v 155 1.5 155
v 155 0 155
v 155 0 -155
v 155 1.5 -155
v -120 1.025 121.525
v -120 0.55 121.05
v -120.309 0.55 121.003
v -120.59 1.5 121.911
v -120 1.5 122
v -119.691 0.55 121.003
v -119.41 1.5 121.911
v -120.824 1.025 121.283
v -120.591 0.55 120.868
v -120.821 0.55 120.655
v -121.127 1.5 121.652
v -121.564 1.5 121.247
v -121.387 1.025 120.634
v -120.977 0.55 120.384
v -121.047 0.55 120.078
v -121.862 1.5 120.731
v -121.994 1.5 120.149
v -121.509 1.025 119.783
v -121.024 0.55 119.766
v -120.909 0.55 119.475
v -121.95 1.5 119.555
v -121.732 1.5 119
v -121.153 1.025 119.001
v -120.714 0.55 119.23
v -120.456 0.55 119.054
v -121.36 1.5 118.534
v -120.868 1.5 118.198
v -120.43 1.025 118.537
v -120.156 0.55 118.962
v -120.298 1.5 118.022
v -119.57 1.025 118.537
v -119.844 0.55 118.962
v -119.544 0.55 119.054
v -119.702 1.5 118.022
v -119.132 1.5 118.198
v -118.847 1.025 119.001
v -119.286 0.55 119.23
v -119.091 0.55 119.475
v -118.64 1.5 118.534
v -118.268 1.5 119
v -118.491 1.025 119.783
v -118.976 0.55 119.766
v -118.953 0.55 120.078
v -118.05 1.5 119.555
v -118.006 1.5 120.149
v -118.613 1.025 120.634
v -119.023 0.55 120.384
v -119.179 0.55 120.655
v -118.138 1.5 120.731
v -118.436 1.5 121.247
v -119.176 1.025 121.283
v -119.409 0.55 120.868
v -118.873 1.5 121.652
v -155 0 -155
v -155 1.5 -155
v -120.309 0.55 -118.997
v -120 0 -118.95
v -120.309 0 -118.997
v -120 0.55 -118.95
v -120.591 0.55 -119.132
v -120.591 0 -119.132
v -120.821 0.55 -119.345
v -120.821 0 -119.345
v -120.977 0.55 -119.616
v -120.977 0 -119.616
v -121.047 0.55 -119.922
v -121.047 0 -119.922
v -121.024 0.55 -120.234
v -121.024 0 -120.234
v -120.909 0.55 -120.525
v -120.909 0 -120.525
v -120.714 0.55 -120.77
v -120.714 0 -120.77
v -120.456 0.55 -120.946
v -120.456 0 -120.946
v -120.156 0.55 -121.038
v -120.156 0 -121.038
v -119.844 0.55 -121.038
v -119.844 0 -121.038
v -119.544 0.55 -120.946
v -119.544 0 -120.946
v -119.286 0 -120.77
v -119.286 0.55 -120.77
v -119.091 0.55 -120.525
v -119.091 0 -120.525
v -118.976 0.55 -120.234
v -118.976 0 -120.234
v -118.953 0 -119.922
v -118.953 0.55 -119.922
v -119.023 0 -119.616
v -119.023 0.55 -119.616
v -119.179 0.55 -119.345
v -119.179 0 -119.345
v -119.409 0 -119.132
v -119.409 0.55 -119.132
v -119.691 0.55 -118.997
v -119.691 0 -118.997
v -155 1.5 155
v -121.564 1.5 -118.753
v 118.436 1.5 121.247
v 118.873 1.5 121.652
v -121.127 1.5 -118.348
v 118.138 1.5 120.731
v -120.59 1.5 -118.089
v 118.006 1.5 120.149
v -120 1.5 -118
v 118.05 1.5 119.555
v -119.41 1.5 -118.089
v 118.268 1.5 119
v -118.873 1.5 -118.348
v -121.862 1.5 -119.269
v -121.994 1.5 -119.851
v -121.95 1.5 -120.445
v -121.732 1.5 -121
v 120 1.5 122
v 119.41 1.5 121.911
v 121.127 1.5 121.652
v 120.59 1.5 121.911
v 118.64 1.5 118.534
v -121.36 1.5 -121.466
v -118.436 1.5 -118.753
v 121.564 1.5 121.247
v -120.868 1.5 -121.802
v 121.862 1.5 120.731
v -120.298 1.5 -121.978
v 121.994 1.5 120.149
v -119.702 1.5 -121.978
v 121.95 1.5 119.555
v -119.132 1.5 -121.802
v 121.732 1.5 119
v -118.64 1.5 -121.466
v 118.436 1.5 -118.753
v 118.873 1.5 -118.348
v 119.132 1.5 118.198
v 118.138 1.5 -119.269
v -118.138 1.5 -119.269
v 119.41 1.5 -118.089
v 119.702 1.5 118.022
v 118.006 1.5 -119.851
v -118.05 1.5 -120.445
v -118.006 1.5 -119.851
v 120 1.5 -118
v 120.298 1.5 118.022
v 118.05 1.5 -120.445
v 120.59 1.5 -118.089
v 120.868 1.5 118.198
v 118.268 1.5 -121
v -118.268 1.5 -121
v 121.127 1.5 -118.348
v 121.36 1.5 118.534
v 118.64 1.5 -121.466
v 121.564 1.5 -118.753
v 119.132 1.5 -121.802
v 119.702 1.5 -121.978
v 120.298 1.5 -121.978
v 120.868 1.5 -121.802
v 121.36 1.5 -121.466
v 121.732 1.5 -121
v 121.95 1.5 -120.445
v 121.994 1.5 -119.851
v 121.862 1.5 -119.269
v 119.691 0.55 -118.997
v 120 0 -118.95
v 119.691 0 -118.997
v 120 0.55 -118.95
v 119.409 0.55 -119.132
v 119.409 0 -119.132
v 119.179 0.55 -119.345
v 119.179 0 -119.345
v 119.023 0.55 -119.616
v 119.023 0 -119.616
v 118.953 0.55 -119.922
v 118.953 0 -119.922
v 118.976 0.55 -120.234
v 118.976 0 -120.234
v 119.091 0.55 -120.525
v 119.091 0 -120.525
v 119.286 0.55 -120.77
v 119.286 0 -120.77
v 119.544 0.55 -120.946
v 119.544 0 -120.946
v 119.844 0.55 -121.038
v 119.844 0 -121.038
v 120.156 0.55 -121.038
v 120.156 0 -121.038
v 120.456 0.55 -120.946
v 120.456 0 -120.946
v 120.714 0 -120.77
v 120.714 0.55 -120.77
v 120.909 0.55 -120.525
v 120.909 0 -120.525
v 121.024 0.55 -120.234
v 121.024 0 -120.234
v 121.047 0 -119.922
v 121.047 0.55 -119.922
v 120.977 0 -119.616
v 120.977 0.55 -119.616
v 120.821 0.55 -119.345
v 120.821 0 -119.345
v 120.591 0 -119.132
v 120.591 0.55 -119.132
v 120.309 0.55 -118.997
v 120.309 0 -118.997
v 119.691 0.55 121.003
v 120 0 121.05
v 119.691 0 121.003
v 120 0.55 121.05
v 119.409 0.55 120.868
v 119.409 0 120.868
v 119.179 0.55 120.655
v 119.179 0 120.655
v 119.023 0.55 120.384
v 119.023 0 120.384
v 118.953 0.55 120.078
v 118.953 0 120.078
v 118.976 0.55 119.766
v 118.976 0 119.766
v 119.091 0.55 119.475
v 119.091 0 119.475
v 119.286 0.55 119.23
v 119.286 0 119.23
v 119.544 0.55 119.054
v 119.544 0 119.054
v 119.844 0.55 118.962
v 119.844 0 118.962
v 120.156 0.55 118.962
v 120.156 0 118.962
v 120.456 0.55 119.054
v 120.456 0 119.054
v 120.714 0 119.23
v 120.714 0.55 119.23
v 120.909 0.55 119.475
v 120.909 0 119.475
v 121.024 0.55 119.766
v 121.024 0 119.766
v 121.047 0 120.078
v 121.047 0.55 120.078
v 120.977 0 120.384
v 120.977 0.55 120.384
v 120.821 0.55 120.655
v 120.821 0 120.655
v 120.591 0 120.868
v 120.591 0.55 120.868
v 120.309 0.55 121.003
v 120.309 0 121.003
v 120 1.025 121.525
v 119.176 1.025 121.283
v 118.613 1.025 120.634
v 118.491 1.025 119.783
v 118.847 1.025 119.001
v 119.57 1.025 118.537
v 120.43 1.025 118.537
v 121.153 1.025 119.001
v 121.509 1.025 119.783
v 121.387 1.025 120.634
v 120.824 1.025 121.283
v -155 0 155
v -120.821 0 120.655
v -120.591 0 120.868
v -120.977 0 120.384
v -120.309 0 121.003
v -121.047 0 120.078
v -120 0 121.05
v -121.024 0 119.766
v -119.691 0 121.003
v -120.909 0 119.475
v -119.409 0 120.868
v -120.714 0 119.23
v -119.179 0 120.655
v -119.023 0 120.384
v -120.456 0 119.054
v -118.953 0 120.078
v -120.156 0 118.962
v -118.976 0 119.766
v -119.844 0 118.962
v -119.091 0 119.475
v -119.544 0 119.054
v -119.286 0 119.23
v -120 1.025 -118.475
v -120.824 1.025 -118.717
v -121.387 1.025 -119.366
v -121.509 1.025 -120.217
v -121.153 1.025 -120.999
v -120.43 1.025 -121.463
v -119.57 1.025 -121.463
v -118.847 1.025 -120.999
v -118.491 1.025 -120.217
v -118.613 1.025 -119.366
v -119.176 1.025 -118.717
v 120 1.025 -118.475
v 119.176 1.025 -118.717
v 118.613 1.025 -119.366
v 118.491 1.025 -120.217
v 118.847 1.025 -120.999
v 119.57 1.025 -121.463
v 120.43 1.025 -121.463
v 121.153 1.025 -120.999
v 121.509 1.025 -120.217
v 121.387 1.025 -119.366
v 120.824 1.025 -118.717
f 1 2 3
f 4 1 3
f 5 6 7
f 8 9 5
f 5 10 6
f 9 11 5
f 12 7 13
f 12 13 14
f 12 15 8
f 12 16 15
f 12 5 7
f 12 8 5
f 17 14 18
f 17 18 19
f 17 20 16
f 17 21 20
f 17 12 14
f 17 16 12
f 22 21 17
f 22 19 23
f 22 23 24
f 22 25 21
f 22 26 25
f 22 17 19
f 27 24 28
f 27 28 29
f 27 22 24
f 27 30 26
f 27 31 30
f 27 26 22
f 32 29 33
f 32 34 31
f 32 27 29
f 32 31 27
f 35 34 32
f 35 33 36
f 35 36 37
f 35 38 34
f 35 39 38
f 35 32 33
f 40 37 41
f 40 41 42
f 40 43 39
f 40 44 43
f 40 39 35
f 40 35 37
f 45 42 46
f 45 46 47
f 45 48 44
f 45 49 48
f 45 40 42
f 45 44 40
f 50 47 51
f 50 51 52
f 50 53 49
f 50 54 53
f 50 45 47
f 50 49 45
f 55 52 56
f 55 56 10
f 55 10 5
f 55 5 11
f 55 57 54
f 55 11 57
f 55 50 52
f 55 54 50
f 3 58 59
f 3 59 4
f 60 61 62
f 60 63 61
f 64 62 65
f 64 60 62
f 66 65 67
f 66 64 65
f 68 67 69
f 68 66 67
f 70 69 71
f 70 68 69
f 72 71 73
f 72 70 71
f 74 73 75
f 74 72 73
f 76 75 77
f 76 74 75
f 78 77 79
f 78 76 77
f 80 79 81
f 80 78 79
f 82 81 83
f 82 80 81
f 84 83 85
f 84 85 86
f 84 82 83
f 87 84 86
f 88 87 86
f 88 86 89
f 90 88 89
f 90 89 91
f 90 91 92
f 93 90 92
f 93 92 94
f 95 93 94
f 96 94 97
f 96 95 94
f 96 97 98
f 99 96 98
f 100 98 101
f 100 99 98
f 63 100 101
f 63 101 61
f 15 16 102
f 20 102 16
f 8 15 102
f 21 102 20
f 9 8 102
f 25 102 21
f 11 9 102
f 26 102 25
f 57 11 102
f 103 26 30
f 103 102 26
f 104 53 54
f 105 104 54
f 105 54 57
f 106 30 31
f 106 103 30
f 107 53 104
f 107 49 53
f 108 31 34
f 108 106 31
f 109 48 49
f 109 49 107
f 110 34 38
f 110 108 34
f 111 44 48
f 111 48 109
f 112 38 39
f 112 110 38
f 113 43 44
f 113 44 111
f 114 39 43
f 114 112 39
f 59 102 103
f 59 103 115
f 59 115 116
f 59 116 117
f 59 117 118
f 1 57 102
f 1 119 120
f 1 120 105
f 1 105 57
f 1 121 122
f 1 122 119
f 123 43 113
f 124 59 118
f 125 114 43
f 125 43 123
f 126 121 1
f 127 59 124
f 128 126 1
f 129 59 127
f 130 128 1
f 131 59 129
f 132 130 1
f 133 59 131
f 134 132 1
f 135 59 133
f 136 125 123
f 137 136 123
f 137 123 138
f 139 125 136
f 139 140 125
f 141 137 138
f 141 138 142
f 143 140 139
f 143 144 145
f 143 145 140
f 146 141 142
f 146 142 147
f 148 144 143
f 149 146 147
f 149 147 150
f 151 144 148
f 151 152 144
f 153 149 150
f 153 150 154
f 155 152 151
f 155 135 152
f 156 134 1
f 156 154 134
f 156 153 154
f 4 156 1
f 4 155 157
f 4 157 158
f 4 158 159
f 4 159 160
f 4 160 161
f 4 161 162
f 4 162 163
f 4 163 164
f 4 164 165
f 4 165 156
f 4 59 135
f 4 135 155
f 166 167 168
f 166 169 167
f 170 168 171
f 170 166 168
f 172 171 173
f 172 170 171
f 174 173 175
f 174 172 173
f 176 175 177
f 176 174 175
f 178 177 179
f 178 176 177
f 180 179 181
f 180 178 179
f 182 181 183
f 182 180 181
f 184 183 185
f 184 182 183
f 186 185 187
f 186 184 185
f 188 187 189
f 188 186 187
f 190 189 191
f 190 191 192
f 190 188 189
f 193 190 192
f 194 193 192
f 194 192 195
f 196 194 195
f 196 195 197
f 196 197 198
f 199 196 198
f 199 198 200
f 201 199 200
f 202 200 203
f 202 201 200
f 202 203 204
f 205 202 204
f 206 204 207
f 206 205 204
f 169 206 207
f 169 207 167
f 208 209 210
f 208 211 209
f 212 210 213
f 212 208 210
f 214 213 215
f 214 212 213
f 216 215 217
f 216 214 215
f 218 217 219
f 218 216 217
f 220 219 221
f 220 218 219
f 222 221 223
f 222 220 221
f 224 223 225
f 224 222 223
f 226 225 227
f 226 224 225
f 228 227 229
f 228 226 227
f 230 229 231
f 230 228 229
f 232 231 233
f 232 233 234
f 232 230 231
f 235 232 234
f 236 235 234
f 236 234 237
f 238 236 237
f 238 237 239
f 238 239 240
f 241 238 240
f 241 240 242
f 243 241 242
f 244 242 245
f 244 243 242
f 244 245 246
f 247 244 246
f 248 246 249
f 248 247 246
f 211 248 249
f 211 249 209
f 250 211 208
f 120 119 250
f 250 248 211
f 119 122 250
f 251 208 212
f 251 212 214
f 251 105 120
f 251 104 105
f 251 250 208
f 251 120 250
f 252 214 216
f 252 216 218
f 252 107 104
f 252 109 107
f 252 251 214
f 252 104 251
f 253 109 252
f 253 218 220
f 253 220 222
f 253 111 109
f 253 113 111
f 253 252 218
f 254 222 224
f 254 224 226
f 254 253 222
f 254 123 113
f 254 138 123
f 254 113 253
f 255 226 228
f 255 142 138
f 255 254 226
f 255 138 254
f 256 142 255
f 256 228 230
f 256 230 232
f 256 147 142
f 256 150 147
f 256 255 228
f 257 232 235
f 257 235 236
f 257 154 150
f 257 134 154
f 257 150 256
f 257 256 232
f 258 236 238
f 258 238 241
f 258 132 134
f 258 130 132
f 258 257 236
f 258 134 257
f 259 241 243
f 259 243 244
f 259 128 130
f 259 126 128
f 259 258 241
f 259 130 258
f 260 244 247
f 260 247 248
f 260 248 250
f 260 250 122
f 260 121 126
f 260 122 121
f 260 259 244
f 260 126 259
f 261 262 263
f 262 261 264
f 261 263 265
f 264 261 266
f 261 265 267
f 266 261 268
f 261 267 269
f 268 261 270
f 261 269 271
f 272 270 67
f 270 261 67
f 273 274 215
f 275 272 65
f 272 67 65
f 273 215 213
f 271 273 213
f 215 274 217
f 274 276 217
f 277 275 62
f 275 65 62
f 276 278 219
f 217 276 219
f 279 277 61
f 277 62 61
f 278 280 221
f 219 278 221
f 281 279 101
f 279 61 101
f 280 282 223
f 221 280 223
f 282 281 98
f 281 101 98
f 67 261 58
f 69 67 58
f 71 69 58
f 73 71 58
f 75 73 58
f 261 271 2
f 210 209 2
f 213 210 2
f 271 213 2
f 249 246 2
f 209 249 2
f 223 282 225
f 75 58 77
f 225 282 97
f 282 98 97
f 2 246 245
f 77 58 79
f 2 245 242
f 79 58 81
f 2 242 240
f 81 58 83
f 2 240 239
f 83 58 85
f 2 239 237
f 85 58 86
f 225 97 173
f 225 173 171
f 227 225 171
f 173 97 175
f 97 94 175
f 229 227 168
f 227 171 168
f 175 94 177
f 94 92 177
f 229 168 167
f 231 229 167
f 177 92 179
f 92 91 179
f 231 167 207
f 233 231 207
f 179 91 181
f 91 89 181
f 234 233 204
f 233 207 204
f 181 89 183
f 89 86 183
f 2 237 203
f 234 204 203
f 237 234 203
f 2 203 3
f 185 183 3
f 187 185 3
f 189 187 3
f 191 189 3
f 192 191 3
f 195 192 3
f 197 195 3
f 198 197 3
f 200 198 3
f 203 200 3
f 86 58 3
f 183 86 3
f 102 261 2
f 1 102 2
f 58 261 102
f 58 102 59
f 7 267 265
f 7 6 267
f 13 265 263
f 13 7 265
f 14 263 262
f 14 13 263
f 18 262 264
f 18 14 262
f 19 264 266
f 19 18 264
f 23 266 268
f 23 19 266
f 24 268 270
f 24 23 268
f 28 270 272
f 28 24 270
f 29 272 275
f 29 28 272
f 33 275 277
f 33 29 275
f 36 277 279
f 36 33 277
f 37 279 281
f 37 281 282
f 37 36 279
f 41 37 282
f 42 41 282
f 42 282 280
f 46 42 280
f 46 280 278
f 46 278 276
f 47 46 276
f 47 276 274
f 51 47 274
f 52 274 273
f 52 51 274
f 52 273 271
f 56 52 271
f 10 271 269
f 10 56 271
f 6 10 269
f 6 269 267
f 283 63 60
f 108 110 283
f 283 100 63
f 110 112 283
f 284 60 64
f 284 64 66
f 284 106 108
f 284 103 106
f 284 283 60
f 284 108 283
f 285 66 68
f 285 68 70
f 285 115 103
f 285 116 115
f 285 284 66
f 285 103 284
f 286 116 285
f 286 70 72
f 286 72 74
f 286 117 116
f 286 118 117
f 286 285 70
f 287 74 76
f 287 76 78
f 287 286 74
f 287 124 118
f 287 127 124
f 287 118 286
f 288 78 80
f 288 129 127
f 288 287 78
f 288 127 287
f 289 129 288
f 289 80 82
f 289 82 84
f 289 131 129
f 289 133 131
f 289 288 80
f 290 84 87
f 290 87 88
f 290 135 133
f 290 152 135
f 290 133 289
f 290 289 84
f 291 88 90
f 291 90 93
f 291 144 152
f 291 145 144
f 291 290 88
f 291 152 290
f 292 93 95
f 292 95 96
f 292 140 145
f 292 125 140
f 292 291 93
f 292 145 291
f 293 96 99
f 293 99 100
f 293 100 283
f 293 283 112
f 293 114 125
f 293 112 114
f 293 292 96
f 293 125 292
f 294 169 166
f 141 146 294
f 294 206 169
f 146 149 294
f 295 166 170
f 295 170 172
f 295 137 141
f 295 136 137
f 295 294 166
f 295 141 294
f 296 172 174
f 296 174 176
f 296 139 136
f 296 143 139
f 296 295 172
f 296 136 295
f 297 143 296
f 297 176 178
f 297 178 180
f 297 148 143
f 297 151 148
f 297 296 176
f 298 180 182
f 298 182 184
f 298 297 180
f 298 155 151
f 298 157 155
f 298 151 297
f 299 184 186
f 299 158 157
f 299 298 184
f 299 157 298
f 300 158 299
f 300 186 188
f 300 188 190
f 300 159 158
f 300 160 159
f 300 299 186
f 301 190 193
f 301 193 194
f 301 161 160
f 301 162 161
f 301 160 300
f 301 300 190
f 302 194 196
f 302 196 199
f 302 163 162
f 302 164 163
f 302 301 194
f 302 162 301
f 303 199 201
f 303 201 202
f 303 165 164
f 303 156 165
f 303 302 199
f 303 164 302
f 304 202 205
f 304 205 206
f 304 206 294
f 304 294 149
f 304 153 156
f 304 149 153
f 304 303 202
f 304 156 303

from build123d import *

# Parameters (mm, degrees)
SKETCH_1_W               = 310
SKETCH_1_H               = 310
EXTRUDE_1_DEPTH          = 1.5
HOLE_WIZARD_1_AT_2_COUNT = 2
HOLE_WIZARD_1_AT_2_PITCH = 240
HOLE_WIZARD_1_AT_3_COUNT = 2
HOLE_WIZARD_1_AT_3_PITCH = 339.41125497
HOLE_WIZARD_1_AT_4_COUNT = 2
HOLE_WIZARD_1_AT_4_PITCH = 240


with BuildPart() as part:
    # 草图1 → 凸台-拉伸1 (new body)
    with BuildSketch(Plane(origin=(0, 0, 0), x_dir=(1, 0, 0), z_dir=(0, 1, 0))):
        Rectangle(SKETCH_1_W, SKETCH_1_H)
    extrude(amount=EXTRUDE_1_DEPTH)

    # 草图3 → 打孔尺寸(%根据)内六角花形沉头螺钉的类型1 (revolve, cut)
    with BuildSketch(Plane(origin=(-120, 1.5, -120), x_dir=(0, 0, 1), z_dir=(1, 0, 0))):
        Polygon((0, 0), (0, 1.5), (1.05, 1.5), (1.05, 0.95), (2, 0), align=None)
    hole_wizard_1 = revolve(axis=Axis((-120, 7.85, -120), (0, -1, 0)), mode=Mode.SUBTRACT)

    # 打孔尺寸(%根据)内六角花形沉头螺钉的类型1 at 2: 打孔尺寸(%根据)内六角花形沉头螺钉的类型1 ×2
    with Locations(*[(i * HOLE_WIZARD_1_AT_2_PITCH, 0, 0) for i in range(1, HOLE_WIZARD_1_AT_2_COUNT)]):
        add(hole_wizard_1, mode=Mode.SUBTRACT)

    # 打孔尺寸(%根据)内六角花形沉头螺钉的类型1 at 3: 打孔尺寸(%根据)内六角花形沉头螺钉的类型1 ×2
    with Locations(*[Vector(0.707106781, 0, 0.707106781) * (i * HOLE_WIZARD_1_AT_3_PITCH) for i in range(1, HOLE_WIZARD_1_AT_3_COUNT)]):
        add(hole_wizard_1, mode=Mode.SUBTRACT)

    # 打孔尺寸(%根据)内六角花形沉头螺钉的类型1 at 4: 打孔尺寸(%根据)内六角花形沉头螺钉的类型1 ×2
    with Locations(*[(0, 0, i * HOLE_WIZARD_1_AT_4_PITCH) for i in range(1, HOLE_WIZARD_1_AT_4_COUNT)]):
        add(hole_wizard_1, mode=Mode.SUBTRACT)


solid = part.part
